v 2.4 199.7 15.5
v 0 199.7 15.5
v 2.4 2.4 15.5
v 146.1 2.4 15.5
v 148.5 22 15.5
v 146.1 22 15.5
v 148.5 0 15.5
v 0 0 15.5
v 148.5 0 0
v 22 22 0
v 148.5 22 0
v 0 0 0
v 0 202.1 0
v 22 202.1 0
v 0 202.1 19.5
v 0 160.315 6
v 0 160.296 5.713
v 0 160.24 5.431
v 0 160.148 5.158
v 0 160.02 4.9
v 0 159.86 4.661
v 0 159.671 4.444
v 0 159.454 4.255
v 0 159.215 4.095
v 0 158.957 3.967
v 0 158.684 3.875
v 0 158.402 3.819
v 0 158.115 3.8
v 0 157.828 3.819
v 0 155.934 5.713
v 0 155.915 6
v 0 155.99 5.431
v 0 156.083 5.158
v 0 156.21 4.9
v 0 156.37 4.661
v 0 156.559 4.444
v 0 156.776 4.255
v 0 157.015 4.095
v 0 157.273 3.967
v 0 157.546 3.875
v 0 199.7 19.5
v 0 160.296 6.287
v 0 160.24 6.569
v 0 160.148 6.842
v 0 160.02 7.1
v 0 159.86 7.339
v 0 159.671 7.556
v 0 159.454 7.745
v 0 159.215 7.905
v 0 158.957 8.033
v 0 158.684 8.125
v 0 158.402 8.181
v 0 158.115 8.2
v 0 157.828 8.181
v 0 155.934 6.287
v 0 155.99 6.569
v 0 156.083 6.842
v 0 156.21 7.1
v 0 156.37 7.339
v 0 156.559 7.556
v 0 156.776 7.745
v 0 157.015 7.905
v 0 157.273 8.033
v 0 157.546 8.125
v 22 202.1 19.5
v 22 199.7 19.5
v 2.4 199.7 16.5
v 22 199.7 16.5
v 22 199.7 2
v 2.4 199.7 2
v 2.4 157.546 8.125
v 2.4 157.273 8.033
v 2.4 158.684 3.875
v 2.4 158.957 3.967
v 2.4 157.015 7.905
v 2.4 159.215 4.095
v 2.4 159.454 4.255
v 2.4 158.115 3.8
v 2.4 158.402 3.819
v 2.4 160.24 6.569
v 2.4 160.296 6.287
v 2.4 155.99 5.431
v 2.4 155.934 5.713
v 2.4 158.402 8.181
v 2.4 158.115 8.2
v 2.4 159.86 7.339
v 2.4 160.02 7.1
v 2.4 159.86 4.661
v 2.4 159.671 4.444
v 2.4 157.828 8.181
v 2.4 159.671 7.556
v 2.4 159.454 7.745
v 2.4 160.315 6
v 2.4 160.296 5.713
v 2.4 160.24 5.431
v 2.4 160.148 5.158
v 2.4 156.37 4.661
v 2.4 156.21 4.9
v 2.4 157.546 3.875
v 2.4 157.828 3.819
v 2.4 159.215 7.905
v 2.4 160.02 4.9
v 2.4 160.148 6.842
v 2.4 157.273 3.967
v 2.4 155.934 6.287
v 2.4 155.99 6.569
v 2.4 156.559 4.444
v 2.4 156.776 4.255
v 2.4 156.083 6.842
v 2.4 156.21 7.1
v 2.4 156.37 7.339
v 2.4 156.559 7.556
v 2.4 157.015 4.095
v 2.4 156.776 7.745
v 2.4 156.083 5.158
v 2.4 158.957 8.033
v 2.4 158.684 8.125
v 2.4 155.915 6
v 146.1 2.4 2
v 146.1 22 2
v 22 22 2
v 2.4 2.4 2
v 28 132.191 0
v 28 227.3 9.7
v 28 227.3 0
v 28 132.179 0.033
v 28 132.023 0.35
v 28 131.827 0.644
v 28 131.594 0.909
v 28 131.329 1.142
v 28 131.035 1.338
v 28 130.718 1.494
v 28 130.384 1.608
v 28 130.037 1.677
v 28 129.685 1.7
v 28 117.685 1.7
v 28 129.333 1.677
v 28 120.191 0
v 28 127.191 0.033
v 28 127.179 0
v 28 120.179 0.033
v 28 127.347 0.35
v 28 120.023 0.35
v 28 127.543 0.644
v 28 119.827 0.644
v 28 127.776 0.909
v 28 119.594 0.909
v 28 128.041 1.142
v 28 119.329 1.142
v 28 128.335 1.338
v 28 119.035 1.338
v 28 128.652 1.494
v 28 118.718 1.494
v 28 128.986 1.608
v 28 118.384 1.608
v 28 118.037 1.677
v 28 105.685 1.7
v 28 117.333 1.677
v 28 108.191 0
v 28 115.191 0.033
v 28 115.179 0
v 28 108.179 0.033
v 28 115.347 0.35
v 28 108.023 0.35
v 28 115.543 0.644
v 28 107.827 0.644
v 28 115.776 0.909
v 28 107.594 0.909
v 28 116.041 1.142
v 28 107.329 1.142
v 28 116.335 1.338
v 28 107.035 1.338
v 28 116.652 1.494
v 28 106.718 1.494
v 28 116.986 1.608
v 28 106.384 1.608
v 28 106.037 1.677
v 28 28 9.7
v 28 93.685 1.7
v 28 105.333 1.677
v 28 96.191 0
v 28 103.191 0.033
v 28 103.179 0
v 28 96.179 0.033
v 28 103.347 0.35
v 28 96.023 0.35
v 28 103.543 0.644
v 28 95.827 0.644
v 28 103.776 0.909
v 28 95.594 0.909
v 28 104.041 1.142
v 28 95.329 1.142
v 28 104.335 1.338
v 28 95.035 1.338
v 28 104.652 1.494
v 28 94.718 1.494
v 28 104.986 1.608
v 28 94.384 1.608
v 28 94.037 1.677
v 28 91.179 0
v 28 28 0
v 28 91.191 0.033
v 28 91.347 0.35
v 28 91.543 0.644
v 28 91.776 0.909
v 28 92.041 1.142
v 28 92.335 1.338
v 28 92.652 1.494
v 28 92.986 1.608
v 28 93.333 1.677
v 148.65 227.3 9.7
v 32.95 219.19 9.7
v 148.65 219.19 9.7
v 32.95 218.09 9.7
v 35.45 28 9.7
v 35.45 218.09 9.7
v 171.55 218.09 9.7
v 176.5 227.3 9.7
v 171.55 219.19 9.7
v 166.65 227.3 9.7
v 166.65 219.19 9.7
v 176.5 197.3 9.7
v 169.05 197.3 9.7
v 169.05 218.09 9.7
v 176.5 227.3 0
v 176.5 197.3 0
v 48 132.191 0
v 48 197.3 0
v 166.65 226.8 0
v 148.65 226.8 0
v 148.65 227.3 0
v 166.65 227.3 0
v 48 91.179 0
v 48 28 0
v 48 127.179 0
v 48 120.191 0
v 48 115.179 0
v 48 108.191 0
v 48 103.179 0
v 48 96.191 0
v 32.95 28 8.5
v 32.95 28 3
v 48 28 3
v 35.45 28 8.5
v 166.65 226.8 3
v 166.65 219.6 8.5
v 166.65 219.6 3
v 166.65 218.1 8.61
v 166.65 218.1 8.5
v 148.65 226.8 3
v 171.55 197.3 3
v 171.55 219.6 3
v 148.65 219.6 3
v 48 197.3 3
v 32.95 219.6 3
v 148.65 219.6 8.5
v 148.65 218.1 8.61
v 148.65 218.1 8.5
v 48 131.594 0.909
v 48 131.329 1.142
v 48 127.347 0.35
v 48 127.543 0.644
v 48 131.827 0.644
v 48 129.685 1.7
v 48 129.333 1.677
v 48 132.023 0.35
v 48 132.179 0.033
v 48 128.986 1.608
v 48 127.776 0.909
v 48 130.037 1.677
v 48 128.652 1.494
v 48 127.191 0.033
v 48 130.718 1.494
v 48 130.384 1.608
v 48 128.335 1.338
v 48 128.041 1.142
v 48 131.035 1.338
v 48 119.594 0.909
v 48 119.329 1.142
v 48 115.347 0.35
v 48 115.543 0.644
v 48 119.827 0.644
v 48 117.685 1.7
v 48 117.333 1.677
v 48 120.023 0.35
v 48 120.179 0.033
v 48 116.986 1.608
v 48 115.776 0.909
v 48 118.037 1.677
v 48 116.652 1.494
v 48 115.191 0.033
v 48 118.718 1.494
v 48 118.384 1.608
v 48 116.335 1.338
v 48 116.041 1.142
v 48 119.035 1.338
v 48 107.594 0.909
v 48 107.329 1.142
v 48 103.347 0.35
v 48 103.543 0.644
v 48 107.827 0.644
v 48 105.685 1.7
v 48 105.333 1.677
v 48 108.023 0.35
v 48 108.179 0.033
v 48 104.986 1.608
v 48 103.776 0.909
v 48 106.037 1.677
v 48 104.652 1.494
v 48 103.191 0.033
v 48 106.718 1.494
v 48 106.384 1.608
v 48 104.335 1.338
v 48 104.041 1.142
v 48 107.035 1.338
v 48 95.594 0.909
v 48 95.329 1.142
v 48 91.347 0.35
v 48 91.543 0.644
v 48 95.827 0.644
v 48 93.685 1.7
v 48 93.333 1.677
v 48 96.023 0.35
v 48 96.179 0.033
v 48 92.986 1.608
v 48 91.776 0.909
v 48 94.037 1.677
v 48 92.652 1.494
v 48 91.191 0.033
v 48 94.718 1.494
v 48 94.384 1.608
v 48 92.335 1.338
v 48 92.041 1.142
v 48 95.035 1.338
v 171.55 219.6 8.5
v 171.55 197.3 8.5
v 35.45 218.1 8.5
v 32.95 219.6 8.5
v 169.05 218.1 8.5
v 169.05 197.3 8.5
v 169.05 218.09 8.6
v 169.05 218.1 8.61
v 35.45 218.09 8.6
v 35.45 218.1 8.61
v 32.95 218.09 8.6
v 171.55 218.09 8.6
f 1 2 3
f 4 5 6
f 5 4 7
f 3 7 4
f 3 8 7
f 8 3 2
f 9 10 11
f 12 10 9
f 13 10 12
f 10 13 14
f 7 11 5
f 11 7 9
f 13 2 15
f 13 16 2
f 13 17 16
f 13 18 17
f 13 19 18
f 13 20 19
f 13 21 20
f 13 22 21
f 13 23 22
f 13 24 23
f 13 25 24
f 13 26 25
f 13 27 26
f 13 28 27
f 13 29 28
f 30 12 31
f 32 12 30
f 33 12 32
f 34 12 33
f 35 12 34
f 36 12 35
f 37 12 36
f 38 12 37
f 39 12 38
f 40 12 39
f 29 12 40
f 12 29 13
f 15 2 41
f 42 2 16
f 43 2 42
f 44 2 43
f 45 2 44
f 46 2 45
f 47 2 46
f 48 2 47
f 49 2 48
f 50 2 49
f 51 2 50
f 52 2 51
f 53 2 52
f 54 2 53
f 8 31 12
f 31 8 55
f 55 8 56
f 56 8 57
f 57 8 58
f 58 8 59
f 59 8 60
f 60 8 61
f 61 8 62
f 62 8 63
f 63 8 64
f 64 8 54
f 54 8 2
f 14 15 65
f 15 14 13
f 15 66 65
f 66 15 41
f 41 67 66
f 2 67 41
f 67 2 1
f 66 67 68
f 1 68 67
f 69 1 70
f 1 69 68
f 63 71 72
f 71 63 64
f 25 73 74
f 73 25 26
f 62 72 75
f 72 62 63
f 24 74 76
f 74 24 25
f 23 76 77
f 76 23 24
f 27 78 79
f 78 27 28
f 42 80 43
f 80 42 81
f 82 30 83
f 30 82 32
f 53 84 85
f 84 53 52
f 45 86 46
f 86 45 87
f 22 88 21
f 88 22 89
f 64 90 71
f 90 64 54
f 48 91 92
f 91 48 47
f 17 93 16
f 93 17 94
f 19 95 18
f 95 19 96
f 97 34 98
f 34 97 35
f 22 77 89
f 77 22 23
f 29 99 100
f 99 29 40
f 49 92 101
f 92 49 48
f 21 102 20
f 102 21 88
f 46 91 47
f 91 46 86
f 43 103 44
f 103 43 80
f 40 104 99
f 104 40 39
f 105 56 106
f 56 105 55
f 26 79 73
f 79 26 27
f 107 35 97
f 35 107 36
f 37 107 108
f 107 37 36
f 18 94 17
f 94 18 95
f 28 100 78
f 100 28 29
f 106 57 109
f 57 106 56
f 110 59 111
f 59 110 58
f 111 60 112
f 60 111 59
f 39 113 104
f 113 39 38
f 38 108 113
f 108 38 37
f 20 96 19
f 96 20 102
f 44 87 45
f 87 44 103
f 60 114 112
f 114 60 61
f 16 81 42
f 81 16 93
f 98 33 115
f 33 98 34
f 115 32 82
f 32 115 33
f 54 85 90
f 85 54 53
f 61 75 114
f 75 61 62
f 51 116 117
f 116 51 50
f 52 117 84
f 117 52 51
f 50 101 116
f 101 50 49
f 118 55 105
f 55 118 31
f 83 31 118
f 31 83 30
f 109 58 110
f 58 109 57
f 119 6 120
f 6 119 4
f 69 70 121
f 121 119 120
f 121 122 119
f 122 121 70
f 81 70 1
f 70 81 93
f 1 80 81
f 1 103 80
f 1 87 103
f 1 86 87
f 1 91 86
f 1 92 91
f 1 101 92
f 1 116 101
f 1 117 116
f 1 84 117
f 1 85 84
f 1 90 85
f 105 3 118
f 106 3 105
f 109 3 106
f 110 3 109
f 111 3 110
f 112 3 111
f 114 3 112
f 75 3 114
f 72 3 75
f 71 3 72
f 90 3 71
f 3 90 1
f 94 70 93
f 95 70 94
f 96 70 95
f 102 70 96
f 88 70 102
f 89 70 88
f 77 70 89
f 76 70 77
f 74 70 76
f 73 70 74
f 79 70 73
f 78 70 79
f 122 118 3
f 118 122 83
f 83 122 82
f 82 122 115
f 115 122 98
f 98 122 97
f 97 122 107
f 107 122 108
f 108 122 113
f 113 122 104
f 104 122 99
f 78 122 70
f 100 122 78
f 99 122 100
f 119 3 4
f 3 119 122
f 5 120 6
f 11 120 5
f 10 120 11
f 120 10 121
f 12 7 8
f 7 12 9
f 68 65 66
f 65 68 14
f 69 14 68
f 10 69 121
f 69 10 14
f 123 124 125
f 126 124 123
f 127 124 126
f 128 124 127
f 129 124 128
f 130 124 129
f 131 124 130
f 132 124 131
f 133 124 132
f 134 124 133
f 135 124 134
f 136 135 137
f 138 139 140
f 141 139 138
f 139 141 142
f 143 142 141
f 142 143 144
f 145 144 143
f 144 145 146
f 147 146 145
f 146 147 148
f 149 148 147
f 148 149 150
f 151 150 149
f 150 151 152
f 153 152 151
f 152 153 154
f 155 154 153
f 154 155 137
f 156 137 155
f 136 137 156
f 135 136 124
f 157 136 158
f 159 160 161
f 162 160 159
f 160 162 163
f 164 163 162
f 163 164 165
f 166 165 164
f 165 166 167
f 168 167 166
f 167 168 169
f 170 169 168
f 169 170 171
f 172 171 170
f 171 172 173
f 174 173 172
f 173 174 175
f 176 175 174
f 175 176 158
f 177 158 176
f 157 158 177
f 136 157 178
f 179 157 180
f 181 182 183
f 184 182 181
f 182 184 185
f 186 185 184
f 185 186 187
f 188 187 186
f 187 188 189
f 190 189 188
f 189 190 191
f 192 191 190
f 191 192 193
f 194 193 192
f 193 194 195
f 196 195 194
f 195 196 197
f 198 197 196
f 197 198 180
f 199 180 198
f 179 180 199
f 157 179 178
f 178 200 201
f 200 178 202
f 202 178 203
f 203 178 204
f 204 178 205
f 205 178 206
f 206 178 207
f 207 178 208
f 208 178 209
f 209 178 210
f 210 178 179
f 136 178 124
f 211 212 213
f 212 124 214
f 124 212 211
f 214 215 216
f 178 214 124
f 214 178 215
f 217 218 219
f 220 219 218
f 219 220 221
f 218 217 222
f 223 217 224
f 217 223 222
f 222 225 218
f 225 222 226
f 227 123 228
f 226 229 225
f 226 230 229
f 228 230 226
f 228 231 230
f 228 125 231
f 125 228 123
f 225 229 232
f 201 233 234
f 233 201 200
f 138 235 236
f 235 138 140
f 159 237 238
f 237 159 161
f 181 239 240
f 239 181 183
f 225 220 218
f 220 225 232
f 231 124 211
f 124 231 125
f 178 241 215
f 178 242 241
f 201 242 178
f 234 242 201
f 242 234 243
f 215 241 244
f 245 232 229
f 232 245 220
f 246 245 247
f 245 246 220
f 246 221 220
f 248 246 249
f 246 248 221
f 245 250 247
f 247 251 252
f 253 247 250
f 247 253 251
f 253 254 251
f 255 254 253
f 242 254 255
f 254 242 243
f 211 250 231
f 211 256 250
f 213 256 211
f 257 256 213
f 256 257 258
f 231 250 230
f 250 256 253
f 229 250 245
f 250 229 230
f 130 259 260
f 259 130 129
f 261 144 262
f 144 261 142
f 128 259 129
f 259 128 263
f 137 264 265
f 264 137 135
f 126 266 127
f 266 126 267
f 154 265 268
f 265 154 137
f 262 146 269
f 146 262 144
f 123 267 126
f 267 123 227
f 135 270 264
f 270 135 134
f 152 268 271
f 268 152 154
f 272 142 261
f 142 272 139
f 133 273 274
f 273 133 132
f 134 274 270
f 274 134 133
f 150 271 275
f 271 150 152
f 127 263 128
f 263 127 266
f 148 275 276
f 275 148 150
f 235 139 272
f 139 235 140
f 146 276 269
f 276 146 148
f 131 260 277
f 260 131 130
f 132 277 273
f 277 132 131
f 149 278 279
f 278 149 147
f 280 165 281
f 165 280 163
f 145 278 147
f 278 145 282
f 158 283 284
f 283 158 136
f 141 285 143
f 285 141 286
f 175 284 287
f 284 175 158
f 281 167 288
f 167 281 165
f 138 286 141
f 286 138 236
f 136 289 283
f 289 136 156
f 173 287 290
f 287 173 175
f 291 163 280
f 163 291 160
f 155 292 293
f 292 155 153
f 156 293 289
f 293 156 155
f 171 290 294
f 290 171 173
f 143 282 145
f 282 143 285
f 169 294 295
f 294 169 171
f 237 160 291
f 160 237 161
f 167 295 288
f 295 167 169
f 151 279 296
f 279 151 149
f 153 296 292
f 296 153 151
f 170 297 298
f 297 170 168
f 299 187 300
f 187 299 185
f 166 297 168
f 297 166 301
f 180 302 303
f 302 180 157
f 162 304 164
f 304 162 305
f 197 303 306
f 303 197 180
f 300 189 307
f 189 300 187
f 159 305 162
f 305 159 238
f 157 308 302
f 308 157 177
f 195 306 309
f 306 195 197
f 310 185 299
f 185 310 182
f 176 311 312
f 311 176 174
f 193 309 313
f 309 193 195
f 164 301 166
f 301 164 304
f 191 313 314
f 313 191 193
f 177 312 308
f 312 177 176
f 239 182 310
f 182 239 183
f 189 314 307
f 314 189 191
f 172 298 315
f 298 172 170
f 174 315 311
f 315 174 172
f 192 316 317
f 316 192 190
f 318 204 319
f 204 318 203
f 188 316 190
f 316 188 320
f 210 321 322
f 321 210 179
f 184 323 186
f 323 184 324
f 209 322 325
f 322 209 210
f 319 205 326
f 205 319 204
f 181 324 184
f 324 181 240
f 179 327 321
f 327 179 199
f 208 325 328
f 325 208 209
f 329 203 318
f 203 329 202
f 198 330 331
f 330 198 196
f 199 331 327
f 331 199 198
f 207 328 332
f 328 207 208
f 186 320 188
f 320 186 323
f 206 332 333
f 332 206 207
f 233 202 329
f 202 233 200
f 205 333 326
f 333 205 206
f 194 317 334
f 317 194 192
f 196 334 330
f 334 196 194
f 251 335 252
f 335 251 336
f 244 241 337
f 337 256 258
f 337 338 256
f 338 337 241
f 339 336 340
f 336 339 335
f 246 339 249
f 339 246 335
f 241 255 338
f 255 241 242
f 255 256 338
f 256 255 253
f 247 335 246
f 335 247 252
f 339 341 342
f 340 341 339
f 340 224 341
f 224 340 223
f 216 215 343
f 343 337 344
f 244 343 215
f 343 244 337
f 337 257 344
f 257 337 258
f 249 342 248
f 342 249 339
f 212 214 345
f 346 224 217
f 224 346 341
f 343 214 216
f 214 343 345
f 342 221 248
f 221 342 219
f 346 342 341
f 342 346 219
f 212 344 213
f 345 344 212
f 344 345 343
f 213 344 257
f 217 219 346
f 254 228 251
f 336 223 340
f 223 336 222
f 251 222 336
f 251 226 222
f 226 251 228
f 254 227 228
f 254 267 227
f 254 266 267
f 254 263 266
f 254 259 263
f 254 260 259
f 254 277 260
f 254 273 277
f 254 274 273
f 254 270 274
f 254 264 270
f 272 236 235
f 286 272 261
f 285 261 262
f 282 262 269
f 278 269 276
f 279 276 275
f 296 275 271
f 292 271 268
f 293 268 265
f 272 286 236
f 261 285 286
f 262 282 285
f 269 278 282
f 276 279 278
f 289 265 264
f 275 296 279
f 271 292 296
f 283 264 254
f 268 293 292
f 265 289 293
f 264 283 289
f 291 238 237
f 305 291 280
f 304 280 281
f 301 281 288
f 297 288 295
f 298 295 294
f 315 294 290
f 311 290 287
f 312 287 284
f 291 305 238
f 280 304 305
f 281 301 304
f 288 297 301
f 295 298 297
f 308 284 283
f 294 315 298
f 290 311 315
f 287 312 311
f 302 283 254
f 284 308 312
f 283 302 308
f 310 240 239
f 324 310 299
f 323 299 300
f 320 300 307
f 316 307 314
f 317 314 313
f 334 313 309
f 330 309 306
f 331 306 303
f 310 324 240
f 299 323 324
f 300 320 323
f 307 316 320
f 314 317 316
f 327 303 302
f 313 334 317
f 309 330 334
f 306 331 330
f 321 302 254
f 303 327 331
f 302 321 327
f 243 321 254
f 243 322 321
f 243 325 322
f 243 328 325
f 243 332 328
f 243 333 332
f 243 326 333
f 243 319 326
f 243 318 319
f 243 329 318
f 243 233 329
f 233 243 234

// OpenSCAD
// Fit test pieces for cyberdeck1 rev 0.1.
//
// Two L-shaped pieces cut from the real halves in ../case/case.scad: one strip across
// the hinge side of each pocket and one strip along a side. They show whether the
// tablet and the folded keyboard go in and out easily, before the full halves print.
//
// Make the plate:  openscad-nightly -o fit_test_plate.stl fit_test.scad

include <../case/case.scad>
view  = "none";      // draw nothing from case.scad itself
hinge = "bevel";

fpart = "plate";     // plate | k_fit | t_fit | x

K_STRIP = 22;        // width of the K piece's strips
T_BOTTOM = 30;       // T piece: length of the strip across the tablet's lower edge
T_SIDE = 20;         // T piece: width of the strip along the tablet's side

// K piece: the hinge-side wall, both side walls near it, one whole side wall, and the
// wall and lip at the free edge. Moved so that its corner is at the origin.
module k_fit() {
    translate([0, -E, T_K]) intersection() {
        k_half();
        union() {
            translate([-1, E, -50]) cube([W + 2, K_STRIP, 100]);
            translate([-1, E, -50]) cube([K_STRIP + 1, D_K + 1, 100]);
        }
    }
}

// T piece: the lower wall with its lip and the cut-out for the USB-C port, both side
// lips near it, and one whole side lip up to the open end.
module t_fit() {
    translate([0, E + D_T, T_T]) intersection() {
        t_half();
        union() {
            translate([-1, -E - T_BOTTOM, -50]) cube([W + 2, T_BOTTOM, 100]);
            translate([-1, -E - D_T - 1, -50]) cube([T_SIDE + 1, D_T + 1, 100]);
        }
    }
}

T_AT = [K_STRIP + 6, K_STRIP + 6];   // the T piece sits inside the K piece's corner

if (fpart == "plate") { k_fit(); translate([T_AT[0], T_AT[1], 0]) t_fit(); }
else if (fpart == "k_fit") k_fit();
else if (fpart == "t_fit") t_fit();
// Plate check: this must be empty. The two pieces must not touch.
else if (fpart == "x") intersection() { k_fit(); translate([T_AT[0] - 2, T_AT[1] - 2, 0]) t_fit(); }
